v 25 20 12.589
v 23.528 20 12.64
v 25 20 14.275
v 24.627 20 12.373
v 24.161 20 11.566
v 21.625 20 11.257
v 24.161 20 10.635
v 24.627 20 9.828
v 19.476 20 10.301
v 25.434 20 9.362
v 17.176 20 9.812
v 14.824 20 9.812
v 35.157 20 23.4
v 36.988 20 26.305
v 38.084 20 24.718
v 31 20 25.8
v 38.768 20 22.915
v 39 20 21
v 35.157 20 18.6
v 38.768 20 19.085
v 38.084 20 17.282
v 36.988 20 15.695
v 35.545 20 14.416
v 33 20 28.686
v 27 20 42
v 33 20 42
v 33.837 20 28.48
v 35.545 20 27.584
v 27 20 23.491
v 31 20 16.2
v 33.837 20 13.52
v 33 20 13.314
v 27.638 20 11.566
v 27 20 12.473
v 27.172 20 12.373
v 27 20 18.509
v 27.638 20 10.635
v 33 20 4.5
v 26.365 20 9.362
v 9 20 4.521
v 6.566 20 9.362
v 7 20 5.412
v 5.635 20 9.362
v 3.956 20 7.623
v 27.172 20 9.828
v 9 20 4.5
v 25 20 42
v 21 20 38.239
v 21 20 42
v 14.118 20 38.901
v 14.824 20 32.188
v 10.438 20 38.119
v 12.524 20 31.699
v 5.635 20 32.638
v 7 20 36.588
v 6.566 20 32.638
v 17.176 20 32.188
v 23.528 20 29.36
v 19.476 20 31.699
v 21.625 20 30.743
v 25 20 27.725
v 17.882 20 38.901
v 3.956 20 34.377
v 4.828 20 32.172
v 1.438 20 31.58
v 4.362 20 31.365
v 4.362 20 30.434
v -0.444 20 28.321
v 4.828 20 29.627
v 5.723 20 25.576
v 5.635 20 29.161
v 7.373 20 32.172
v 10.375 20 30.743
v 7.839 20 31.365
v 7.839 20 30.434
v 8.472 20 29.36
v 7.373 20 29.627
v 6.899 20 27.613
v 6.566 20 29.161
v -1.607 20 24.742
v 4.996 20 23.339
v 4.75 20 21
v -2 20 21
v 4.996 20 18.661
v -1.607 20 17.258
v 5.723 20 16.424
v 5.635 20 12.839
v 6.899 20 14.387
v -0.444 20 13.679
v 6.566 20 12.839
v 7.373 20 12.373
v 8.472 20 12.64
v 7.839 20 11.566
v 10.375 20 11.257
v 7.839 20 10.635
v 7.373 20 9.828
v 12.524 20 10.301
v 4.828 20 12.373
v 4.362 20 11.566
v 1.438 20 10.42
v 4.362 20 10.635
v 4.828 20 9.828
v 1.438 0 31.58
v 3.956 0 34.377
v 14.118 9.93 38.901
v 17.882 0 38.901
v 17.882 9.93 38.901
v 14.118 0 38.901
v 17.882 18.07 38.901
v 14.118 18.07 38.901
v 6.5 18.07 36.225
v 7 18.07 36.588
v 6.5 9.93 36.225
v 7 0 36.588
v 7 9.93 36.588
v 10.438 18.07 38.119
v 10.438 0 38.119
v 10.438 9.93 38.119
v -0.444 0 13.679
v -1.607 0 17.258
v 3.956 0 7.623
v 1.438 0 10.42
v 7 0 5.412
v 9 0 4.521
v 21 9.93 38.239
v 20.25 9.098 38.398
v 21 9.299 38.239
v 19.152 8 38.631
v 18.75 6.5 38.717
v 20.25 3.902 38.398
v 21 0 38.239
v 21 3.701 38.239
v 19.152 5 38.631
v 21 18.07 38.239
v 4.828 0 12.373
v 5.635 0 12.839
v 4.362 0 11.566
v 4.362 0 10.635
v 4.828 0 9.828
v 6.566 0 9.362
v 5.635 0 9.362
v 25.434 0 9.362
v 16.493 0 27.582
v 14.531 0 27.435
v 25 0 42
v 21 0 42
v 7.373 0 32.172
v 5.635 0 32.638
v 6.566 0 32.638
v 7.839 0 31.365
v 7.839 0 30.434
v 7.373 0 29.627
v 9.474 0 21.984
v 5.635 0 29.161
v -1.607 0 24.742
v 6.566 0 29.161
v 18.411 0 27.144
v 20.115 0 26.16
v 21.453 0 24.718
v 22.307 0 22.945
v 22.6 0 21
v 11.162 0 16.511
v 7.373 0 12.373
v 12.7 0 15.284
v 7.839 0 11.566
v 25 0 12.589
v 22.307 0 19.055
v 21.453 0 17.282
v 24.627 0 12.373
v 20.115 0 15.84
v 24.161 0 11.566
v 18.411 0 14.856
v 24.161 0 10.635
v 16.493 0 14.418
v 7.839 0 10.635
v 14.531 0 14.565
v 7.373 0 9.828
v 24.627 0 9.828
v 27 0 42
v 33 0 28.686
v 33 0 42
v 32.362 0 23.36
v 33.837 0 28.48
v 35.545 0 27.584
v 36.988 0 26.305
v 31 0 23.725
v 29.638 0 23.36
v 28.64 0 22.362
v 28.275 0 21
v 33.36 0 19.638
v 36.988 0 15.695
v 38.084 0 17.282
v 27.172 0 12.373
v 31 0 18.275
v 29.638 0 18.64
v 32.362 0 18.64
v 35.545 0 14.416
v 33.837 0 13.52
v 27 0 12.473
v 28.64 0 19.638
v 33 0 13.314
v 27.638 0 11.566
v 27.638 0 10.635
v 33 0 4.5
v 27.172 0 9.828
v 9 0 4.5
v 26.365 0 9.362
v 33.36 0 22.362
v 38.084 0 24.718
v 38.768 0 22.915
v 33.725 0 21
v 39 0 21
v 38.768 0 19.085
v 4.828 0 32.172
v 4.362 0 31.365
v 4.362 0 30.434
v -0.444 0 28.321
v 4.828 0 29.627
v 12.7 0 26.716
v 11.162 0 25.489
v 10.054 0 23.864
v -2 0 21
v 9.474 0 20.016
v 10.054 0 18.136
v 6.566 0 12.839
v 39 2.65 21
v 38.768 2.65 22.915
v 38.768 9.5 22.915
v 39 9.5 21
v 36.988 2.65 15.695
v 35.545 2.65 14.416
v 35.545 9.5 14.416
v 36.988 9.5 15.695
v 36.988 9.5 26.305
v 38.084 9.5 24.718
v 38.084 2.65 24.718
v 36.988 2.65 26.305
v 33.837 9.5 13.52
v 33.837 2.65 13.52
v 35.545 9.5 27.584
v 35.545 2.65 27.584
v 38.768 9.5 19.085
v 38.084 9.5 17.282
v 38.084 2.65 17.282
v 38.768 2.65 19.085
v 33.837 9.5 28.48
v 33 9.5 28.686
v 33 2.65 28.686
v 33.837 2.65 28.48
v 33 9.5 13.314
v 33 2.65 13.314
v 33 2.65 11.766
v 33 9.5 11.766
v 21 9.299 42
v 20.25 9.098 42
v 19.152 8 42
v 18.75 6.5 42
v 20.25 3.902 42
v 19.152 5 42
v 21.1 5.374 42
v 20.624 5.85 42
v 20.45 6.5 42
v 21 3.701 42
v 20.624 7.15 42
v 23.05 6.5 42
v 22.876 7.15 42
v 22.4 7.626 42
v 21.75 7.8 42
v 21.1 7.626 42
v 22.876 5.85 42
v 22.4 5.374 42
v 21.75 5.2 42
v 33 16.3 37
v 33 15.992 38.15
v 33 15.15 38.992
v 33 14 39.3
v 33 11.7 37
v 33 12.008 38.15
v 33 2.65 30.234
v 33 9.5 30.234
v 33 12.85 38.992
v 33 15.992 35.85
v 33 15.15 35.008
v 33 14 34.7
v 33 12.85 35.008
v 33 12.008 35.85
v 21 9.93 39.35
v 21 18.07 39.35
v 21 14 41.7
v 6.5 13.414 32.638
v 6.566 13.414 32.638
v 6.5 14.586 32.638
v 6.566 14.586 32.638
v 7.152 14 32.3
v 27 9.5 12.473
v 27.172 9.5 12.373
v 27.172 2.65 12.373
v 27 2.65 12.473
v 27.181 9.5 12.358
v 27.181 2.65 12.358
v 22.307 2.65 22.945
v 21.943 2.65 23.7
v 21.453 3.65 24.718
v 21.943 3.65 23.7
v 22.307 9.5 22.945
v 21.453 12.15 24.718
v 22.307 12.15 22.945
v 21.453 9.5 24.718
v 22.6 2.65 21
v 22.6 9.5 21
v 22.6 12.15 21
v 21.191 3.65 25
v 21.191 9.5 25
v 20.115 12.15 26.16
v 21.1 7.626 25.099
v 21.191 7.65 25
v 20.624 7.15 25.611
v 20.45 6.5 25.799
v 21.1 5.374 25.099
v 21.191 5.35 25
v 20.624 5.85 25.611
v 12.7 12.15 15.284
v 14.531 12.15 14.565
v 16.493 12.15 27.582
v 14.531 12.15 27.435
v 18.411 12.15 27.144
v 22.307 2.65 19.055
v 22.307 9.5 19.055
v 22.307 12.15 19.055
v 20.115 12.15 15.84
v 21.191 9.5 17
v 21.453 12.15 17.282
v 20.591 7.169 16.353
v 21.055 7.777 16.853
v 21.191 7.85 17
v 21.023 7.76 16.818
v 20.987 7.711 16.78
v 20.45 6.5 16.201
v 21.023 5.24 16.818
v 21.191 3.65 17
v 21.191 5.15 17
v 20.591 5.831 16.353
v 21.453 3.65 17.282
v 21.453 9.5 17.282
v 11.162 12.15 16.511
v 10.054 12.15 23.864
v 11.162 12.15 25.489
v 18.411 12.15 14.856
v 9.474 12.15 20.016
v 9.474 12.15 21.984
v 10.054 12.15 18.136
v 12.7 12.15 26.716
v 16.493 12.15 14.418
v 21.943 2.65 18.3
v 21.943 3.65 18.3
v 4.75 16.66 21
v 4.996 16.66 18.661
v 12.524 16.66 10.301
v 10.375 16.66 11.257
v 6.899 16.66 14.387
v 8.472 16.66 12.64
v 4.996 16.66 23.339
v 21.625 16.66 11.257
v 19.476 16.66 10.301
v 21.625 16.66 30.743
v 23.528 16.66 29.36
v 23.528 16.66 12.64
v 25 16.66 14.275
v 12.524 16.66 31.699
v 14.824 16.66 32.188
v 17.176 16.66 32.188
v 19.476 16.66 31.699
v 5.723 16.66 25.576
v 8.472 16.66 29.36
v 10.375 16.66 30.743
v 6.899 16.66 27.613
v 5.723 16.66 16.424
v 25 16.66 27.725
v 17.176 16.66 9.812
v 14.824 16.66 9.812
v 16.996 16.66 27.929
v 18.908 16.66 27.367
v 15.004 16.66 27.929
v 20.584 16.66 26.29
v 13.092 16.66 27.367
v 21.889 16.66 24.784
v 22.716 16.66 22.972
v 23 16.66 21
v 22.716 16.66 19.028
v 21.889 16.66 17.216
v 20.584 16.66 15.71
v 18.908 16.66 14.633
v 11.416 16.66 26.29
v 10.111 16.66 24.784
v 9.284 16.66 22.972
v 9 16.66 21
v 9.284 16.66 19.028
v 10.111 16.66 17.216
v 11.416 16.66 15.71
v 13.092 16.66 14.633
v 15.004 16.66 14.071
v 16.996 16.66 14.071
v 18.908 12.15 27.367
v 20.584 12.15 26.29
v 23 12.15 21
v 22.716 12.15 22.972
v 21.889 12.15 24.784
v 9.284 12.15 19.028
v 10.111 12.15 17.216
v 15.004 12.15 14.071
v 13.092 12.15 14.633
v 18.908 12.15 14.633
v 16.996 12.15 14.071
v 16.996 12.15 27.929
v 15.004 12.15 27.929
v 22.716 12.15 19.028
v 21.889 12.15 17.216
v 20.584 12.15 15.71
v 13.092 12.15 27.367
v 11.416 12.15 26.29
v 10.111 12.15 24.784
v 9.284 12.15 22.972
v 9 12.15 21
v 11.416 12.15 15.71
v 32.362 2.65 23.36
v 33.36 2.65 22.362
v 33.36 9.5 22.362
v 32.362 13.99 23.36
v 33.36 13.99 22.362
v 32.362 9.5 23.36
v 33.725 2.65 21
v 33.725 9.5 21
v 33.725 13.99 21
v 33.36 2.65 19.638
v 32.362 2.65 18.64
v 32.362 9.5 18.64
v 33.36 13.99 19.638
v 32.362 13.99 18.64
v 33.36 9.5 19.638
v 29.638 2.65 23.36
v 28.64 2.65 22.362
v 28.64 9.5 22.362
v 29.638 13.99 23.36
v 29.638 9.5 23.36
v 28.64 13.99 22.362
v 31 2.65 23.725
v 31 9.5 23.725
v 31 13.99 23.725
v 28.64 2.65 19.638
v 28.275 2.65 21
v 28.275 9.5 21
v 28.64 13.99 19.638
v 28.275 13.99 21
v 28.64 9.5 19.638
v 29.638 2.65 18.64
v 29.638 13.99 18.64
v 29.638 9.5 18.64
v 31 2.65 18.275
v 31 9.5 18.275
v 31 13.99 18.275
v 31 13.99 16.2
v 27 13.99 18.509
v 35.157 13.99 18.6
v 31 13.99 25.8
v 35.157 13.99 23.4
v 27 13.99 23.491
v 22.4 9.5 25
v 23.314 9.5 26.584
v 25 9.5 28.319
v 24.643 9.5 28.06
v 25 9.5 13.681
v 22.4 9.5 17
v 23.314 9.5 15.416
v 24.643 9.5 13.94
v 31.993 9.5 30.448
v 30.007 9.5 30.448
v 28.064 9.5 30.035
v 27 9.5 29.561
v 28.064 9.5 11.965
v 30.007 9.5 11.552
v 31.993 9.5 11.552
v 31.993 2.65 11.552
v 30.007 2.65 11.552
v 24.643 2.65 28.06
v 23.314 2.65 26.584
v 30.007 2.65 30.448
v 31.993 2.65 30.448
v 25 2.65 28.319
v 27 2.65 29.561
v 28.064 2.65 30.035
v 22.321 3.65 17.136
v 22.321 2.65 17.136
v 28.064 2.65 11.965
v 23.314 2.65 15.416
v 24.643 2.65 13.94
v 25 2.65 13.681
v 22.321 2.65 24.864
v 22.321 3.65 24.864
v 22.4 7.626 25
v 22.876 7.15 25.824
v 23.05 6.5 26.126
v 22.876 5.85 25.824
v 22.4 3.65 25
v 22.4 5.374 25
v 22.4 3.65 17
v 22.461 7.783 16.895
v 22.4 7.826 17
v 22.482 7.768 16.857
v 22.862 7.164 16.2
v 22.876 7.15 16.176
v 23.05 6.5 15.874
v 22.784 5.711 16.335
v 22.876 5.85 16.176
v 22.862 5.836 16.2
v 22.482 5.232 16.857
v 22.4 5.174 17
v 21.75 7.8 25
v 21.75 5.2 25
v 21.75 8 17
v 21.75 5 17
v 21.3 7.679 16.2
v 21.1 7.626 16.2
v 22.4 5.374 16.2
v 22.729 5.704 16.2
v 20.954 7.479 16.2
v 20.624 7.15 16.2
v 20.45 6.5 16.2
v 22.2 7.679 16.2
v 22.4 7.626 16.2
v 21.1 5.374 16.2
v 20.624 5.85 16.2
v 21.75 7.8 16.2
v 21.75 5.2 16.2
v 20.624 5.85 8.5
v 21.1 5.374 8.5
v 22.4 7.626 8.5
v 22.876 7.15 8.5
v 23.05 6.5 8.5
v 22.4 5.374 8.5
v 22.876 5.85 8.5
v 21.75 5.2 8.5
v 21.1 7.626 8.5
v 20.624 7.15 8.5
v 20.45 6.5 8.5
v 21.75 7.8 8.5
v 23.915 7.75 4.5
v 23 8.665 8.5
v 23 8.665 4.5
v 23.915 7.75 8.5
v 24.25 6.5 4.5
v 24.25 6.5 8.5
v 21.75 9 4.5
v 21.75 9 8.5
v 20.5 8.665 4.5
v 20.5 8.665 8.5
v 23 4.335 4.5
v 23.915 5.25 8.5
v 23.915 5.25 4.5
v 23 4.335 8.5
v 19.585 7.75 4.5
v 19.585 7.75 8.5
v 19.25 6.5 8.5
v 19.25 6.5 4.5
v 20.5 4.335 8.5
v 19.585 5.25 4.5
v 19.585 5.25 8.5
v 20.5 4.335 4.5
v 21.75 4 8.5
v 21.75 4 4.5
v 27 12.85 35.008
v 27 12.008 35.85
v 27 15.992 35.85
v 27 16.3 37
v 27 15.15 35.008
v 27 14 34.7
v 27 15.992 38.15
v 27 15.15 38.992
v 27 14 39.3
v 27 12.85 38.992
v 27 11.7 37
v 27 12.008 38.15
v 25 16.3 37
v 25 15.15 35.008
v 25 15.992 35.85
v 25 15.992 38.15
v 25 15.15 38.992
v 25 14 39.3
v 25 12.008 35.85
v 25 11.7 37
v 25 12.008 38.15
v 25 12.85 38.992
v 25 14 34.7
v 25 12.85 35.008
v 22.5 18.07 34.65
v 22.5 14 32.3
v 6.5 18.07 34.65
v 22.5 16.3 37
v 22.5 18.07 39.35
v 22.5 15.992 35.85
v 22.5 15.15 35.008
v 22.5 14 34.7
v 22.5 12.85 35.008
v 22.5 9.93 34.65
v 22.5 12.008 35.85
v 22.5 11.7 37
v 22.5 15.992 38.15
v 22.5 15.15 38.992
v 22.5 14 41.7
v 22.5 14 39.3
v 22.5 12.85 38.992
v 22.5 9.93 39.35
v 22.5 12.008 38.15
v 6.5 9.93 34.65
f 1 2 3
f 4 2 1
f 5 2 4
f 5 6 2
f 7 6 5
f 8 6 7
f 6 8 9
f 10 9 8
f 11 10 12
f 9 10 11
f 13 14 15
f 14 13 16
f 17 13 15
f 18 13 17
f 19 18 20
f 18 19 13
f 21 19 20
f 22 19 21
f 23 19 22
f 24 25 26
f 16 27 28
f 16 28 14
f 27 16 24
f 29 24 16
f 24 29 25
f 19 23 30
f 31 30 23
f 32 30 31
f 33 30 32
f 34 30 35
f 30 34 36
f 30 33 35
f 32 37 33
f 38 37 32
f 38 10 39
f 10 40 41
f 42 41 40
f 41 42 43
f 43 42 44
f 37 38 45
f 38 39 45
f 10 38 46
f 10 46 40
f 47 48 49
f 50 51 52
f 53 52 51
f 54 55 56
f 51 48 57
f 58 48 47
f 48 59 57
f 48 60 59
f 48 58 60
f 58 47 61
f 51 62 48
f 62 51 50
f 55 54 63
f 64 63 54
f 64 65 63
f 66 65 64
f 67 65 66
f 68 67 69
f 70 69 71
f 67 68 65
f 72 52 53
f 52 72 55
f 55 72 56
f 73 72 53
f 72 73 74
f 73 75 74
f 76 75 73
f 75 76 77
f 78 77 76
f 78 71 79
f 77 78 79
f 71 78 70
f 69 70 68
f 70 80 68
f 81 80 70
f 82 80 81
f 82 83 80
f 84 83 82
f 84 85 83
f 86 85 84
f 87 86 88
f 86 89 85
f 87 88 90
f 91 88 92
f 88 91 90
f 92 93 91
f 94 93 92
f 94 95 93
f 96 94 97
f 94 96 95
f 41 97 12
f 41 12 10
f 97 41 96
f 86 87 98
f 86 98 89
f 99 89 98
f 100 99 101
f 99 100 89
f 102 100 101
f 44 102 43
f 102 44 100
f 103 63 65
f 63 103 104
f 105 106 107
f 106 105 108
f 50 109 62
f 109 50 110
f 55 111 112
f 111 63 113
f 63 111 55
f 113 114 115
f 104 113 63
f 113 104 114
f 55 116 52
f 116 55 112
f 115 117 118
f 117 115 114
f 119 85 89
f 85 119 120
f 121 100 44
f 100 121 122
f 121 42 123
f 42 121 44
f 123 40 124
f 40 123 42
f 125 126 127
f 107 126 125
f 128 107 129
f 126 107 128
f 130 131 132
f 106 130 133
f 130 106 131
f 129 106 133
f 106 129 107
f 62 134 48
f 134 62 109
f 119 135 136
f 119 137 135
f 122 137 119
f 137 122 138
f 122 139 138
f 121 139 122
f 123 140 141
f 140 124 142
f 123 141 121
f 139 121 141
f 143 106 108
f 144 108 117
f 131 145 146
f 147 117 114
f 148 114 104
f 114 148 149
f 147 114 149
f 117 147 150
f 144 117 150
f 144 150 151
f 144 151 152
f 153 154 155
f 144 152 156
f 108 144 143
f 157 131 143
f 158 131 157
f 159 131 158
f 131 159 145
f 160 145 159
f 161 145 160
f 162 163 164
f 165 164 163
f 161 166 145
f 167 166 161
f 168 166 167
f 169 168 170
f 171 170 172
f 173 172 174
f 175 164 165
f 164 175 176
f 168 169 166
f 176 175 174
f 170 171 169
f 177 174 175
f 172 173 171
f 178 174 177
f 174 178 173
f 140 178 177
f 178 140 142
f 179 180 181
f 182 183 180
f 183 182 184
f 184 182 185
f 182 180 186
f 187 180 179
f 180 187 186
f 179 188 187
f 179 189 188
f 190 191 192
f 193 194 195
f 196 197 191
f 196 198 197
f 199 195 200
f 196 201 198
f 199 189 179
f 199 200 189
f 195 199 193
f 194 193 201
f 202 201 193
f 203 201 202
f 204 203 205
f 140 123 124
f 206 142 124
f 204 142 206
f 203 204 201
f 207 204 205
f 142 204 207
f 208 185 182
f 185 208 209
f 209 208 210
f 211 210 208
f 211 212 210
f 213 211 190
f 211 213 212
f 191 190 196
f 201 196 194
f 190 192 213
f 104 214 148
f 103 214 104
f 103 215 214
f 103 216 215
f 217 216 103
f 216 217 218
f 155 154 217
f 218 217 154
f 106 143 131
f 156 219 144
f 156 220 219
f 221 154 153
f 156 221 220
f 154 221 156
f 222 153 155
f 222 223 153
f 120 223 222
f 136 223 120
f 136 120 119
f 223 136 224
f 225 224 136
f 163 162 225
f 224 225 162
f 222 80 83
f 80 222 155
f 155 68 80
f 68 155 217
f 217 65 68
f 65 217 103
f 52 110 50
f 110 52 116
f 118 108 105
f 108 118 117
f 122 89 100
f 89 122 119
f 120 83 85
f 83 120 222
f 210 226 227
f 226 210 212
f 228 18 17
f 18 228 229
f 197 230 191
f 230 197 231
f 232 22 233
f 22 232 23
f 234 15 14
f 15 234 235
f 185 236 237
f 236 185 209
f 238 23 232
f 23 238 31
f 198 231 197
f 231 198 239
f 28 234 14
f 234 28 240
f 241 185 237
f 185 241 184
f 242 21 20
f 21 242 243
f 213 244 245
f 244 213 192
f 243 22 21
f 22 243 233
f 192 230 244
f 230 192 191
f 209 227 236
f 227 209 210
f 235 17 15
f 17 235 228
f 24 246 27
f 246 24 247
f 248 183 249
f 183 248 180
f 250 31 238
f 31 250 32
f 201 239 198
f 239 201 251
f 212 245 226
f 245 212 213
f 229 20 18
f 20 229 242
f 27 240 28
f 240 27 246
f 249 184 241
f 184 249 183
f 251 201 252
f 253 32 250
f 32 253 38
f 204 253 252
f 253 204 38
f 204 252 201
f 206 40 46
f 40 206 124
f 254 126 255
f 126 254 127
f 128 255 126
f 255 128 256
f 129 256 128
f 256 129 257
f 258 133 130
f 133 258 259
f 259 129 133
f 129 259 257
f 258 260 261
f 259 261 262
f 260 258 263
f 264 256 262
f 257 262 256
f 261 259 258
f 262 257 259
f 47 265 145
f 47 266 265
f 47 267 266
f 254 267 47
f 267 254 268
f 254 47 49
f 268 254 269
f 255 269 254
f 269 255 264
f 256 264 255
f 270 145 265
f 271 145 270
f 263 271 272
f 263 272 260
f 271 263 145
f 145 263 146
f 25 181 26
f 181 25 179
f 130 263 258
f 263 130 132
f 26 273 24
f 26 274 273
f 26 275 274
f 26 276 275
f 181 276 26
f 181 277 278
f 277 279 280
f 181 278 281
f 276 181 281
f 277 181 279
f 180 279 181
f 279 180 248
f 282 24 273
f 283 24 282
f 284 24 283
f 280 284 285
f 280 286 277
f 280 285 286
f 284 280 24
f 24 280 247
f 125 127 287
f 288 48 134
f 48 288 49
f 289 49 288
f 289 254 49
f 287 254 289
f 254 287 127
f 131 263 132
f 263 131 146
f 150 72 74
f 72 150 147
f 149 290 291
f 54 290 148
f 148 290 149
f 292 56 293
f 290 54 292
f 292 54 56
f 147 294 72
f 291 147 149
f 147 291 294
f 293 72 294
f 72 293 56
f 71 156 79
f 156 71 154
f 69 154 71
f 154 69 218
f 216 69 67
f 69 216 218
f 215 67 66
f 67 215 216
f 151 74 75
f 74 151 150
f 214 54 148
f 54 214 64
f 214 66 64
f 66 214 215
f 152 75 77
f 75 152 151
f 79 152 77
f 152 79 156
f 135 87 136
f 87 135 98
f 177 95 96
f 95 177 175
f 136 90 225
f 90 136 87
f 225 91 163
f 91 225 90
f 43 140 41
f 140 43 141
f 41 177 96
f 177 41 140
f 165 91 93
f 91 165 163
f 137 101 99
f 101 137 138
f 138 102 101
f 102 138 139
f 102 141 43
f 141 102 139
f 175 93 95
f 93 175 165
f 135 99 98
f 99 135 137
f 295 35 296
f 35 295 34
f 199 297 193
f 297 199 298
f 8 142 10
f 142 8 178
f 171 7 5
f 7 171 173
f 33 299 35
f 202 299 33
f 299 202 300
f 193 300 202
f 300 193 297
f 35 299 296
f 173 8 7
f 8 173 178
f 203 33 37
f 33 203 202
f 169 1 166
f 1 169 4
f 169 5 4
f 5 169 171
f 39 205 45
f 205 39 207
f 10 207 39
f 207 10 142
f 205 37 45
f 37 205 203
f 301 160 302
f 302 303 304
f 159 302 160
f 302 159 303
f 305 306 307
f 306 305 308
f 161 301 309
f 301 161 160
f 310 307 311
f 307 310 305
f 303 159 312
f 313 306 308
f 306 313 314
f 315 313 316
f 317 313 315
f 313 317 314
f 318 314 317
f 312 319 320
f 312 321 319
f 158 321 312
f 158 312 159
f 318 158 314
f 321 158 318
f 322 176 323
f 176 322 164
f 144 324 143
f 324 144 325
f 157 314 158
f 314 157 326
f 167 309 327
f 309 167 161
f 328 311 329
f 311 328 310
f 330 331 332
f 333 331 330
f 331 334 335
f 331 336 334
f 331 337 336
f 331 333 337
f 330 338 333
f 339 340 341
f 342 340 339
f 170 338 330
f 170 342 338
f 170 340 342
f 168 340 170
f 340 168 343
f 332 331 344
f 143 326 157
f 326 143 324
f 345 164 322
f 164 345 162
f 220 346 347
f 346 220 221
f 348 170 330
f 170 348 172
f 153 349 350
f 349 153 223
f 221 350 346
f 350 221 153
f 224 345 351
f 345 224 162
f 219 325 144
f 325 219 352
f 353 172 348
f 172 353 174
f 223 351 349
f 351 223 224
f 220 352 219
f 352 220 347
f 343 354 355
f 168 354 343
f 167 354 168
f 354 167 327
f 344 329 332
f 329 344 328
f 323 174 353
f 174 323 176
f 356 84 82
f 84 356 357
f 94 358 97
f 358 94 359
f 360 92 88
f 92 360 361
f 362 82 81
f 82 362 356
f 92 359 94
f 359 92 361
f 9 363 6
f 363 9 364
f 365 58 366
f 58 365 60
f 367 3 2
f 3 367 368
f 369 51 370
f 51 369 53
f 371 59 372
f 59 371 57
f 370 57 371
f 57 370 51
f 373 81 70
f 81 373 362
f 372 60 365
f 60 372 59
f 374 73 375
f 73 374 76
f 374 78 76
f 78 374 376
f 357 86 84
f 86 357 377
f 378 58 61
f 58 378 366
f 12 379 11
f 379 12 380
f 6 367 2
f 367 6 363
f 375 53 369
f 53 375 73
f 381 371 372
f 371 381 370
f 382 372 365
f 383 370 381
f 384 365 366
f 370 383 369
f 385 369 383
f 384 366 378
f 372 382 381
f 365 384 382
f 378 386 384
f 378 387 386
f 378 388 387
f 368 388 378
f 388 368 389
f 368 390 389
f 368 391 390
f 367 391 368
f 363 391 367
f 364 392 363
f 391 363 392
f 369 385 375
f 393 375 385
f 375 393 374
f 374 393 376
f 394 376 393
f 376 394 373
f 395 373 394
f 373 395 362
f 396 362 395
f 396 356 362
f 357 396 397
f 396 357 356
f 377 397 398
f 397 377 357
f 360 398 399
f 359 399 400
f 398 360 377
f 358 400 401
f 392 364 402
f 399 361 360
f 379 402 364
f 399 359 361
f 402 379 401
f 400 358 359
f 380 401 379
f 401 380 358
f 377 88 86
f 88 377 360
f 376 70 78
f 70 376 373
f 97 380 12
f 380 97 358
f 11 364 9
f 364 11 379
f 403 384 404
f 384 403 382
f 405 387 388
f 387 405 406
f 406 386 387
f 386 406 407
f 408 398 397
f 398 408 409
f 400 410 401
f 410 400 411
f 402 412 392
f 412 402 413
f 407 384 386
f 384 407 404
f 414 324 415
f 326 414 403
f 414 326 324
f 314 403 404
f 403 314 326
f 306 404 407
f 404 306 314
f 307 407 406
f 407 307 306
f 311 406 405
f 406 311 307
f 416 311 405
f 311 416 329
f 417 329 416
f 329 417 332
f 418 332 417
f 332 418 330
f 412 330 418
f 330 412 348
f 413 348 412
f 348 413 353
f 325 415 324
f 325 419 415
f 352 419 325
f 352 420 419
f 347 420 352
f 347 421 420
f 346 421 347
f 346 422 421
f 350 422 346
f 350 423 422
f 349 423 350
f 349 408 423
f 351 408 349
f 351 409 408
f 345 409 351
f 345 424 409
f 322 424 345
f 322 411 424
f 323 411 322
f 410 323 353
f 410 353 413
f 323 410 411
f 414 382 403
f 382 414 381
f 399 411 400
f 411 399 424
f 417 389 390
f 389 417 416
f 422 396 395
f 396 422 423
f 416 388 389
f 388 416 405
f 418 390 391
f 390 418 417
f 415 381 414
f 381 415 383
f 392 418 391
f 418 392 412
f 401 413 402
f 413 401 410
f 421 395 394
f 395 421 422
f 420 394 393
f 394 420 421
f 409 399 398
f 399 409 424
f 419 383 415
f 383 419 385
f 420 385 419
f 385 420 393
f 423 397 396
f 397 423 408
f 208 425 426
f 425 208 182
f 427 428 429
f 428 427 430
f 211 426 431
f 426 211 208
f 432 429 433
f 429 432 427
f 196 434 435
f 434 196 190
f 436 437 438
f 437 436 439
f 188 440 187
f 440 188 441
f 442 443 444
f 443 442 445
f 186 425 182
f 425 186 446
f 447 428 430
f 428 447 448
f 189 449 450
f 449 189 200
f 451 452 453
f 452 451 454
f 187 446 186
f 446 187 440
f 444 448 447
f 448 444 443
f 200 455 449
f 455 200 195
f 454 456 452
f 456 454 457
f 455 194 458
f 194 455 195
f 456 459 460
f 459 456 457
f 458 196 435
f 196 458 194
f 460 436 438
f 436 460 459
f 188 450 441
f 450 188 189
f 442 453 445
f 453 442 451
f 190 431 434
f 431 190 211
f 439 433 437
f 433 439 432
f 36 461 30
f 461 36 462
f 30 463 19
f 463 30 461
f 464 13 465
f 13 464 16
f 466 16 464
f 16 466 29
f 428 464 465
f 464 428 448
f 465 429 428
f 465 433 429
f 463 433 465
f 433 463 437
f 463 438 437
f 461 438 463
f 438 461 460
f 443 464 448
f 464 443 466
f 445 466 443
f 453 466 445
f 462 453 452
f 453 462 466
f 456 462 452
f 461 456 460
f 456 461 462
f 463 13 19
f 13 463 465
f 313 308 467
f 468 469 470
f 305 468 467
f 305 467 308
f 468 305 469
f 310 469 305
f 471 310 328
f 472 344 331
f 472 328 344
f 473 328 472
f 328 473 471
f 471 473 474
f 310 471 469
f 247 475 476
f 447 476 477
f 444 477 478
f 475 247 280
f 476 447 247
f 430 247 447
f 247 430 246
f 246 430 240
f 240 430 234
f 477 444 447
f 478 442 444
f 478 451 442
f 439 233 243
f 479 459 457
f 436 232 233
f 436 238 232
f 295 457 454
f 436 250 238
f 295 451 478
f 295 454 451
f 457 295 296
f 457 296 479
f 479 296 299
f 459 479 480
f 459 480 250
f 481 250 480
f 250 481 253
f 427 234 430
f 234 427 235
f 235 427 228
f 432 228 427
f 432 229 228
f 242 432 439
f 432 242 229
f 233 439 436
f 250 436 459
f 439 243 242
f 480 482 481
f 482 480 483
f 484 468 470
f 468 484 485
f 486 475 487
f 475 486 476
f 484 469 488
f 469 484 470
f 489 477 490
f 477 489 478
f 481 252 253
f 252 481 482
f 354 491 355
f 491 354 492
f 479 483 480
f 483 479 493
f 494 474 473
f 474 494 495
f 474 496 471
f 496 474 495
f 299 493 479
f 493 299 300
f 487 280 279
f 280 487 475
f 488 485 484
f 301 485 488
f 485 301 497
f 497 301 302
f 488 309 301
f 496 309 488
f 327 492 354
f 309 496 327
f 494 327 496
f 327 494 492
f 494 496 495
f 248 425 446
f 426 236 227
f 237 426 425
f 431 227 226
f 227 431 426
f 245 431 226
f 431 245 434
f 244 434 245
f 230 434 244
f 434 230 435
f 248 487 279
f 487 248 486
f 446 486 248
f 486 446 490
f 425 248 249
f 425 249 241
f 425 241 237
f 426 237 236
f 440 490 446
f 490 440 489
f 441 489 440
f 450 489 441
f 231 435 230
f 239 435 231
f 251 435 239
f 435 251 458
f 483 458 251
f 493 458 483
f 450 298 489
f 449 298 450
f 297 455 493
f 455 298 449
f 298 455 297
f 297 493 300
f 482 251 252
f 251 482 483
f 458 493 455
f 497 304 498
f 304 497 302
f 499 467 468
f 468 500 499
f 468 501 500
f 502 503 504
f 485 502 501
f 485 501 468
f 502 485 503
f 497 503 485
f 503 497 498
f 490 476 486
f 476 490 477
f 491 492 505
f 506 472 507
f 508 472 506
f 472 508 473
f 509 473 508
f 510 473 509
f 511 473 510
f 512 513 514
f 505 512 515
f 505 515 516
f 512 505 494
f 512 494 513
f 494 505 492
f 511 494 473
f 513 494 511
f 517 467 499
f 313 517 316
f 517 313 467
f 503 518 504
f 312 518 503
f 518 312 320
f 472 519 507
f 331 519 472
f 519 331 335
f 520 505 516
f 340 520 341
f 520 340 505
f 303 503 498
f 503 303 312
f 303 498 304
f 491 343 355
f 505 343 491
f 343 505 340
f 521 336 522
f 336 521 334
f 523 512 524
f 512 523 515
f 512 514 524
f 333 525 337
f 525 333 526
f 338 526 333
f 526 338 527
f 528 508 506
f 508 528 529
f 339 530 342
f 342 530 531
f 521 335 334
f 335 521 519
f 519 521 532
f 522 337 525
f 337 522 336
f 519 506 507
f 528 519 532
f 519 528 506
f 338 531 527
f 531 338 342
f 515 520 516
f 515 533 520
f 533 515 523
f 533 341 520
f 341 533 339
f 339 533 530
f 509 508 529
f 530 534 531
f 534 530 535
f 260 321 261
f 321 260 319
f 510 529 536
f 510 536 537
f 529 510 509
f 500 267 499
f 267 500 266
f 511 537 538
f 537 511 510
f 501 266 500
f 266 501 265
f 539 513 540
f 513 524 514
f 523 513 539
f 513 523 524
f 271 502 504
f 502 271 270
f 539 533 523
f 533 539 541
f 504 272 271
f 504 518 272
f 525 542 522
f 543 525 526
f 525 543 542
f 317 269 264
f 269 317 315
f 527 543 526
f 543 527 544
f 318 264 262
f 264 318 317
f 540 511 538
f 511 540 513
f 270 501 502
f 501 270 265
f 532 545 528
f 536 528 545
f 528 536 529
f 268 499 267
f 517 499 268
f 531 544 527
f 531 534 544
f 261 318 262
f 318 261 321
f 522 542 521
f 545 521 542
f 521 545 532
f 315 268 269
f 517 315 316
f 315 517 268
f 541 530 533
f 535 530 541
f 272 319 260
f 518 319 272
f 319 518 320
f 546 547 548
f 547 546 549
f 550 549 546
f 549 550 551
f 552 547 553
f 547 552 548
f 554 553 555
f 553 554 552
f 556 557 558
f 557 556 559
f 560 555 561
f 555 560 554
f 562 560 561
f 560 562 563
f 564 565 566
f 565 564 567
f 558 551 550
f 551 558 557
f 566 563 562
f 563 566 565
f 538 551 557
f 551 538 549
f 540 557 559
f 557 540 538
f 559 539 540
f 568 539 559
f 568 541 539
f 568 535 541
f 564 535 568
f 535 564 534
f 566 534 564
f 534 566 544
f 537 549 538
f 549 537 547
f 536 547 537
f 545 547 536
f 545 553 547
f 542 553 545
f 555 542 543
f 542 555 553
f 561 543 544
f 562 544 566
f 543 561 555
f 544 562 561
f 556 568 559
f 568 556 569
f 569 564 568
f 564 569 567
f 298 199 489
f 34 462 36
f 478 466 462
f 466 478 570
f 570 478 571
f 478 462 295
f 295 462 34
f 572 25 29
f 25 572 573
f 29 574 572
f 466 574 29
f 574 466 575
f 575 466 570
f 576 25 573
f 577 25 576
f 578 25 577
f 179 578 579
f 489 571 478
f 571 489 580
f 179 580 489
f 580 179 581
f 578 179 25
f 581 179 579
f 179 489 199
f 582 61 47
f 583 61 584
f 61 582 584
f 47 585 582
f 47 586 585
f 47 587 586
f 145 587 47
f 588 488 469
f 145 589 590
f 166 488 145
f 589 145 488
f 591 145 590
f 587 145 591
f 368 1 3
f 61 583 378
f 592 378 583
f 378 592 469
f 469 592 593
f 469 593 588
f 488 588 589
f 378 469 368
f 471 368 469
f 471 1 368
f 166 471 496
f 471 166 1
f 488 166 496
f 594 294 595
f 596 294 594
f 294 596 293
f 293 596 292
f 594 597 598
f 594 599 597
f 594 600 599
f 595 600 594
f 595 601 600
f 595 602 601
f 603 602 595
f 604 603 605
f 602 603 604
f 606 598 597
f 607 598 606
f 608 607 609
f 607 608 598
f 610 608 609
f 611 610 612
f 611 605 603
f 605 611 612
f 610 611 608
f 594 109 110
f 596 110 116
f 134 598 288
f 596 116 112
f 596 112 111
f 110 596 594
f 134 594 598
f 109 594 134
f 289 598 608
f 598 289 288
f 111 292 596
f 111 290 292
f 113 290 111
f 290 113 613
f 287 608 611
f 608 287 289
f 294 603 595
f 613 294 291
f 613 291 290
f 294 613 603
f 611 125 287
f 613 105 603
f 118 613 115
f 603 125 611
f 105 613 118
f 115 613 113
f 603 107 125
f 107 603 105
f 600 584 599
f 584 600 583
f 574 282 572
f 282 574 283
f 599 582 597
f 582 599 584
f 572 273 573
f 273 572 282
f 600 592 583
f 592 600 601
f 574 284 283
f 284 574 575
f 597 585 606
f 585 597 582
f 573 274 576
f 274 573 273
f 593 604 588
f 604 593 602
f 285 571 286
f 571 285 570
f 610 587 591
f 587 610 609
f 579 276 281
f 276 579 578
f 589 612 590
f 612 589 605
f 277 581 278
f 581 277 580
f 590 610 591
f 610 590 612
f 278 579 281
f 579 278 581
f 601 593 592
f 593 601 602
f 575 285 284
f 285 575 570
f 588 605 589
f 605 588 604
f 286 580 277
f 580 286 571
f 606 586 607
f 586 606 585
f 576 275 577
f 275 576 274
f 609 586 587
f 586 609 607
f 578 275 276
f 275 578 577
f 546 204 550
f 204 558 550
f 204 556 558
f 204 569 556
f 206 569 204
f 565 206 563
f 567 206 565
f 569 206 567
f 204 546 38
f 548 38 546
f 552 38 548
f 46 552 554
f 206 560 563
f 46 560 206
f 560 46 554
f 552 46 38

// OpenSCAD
first_layer = 0.3;

difference() {
	
	union() {
		//main cylinder
		translate([16,20,21]) rotate([90,0,0]) cylinder(h=20, r=18);//cube([44, 20, 42]);
		
		//bearing mount
		translate([31,20,21]) rotate([90,0,0]) cylinder (h=20, r=8);
		
		//V3 Mount
		translate([9,0,-7]) cube([24, 20, 22]);
		translate([21,first_layer/2,-11]) rotate([90,0,0]) cube([24, 22, first_layer], center=true);
		//translate([27,first_layer/2,45]) rotate([90,0,0]) cube([12, 22, first_layer], center=true);
		
		//filament support
		translate([21.75,6.5,34]) rotate([0,0,0]) cylinder (h=8, r=3, $fn=12);
		
		//groovemount supports
//		translate([33,6.5,-7]) rotate([0,0,0]) cylinder (h=16, r=5, $fn=12);
//		translate([9,6.5,-7]) rotate([0,0,0]) cylinder (h=16, r=5, $fn=12);
		
		//clamp
		translate([21,0,28]) cube([12, 20, 14]);
	}
	
	//pulley opening
	translate([16,21,21]) rotate([90,0,0]){
		cylinder (h=22, r=6.6);
		
		rotate([0,0,45]) {
		//translate([14,0,0]) cylinder(h=22, r=1.6, $fn=12);
		translate([0,14,0]) cylinder(h=22, r=1.8, $fn=12);
		translate([-14,0,0]) cylinder(h=22, r=1.8, $fn=12);
		translate([0,-14,0]) cylinder(h=22, r=1.8, $fn=12);
		}
	}
	
	//gearhead indentation
	translate([16,20.01,21]) rotate([90,0,0]) cylinder (h=3.35, r=11.25);

	//pulley hub indentation
	translate([16,20-2,21]) rotate([90,0,0]) cylinder (h=5.85, r=7);
	
	//bearing screws
	translate([31,21,21]) rotate([90,0,0]) cylinder (h=22, r=2.725, $fn=12); //precision m5

	//translate([31,21,21]) rotate([90,0,0]) cylinder (h=22, r=2.6, $fn=12); //regular M5 screw
	//translate([31,22,21]) rotate([90,30,0]) cylinder (h=8.01, r=8.1/2, $fn=6); //M4
	translate([31,22,21]) rotate([90,30,0]) cylinder (h=8.01, r=4.8, $fn=6); //M5
	
	//bearing
	translate([31,9.5,21]) rotate([90,0,0]) cylinder (h=6.85, r=9.5);
	//translate([25,9.5-5.25,21-8.25-2]) cube([20, 5.85, 18.5]);
	
	//opening between bearing and pulley
	translate([20,9.5-5.85,21-8.25+3.25+1]) cube([10, 5.85, 8]);

	//filament path chamfer
	translate([21.75,6.5,15]) rotate([0,0,0]) cylinder (h=2, r1=1, r2=1.5, $fn=12);		

	translate([31,9.5,21]) rotate([90,0,0]) cylinder (h=5.85, r=8.5);

	
	//filament path
	translate([21.75,6.5,-10]) rotate([0,0,0]) cylinder (h=60, r=1.3, $fn=12); 
	translate([21.75,6.5,-51.5]) rotate([0,0,0]) cylinder (h=60, r=2.5, $fn=12); 
	
	//V3 Mount
//	translate([21.75,6.5,-2]) rotate([0,0,0]) cylinder (h=5, r=8.25);
	translate([21.75,6.5,-7]) rotate([0,0,0]) cylinder (h=8, r=4.5);
//	translate([21.75-8,6.5-8,-2]) cube([16, 8, 5]);
//	translate([21.75-6,6.5-7,-7]) cube([12, 7, 5]);
	translate([21.75,6.5,3.5]) rotate([90,0,0]) cylinder (h=10, r=1,  $fn=12);
	
	//groovemount supports
//	translate([33,6.5,-8]) rotate([0,0,0]) cylinder (h=20, r=1.6, $fn=12);
//	translate([33,6.5,7]) rotate([0,0,0]) cylinder (h=3, r=3.5, $fn=6);

//	translate([9,6.5,-8]) rotate([0,0,0]) cylinder (h=20, r=1.6, $fn=12);
//	translate([9,6.5,7]) rotate([0,0,0]) cylinder (h=3, r=3.5, $fn=6);
//	translate([3,3,7]) cube([8, 7, 3]);
	
	//clamp slit
	translate([25,-1,10]) cube([2, 22, 35]);
	//clamp nut
	translate([6.5,14,37]) rotate([0,90,0]) cylinder (h=16, r=4.7, $fn=6);
	//clamp screw hole
	translate([15,14,37]) rotate([0,90,0]) cylinder (h=20, r=2.3, $fn=12);
	
	translate([9,-2,-25.5])cube(30,20,10);
    translate([9,-2,43.5])cube(30,20,10);
}
